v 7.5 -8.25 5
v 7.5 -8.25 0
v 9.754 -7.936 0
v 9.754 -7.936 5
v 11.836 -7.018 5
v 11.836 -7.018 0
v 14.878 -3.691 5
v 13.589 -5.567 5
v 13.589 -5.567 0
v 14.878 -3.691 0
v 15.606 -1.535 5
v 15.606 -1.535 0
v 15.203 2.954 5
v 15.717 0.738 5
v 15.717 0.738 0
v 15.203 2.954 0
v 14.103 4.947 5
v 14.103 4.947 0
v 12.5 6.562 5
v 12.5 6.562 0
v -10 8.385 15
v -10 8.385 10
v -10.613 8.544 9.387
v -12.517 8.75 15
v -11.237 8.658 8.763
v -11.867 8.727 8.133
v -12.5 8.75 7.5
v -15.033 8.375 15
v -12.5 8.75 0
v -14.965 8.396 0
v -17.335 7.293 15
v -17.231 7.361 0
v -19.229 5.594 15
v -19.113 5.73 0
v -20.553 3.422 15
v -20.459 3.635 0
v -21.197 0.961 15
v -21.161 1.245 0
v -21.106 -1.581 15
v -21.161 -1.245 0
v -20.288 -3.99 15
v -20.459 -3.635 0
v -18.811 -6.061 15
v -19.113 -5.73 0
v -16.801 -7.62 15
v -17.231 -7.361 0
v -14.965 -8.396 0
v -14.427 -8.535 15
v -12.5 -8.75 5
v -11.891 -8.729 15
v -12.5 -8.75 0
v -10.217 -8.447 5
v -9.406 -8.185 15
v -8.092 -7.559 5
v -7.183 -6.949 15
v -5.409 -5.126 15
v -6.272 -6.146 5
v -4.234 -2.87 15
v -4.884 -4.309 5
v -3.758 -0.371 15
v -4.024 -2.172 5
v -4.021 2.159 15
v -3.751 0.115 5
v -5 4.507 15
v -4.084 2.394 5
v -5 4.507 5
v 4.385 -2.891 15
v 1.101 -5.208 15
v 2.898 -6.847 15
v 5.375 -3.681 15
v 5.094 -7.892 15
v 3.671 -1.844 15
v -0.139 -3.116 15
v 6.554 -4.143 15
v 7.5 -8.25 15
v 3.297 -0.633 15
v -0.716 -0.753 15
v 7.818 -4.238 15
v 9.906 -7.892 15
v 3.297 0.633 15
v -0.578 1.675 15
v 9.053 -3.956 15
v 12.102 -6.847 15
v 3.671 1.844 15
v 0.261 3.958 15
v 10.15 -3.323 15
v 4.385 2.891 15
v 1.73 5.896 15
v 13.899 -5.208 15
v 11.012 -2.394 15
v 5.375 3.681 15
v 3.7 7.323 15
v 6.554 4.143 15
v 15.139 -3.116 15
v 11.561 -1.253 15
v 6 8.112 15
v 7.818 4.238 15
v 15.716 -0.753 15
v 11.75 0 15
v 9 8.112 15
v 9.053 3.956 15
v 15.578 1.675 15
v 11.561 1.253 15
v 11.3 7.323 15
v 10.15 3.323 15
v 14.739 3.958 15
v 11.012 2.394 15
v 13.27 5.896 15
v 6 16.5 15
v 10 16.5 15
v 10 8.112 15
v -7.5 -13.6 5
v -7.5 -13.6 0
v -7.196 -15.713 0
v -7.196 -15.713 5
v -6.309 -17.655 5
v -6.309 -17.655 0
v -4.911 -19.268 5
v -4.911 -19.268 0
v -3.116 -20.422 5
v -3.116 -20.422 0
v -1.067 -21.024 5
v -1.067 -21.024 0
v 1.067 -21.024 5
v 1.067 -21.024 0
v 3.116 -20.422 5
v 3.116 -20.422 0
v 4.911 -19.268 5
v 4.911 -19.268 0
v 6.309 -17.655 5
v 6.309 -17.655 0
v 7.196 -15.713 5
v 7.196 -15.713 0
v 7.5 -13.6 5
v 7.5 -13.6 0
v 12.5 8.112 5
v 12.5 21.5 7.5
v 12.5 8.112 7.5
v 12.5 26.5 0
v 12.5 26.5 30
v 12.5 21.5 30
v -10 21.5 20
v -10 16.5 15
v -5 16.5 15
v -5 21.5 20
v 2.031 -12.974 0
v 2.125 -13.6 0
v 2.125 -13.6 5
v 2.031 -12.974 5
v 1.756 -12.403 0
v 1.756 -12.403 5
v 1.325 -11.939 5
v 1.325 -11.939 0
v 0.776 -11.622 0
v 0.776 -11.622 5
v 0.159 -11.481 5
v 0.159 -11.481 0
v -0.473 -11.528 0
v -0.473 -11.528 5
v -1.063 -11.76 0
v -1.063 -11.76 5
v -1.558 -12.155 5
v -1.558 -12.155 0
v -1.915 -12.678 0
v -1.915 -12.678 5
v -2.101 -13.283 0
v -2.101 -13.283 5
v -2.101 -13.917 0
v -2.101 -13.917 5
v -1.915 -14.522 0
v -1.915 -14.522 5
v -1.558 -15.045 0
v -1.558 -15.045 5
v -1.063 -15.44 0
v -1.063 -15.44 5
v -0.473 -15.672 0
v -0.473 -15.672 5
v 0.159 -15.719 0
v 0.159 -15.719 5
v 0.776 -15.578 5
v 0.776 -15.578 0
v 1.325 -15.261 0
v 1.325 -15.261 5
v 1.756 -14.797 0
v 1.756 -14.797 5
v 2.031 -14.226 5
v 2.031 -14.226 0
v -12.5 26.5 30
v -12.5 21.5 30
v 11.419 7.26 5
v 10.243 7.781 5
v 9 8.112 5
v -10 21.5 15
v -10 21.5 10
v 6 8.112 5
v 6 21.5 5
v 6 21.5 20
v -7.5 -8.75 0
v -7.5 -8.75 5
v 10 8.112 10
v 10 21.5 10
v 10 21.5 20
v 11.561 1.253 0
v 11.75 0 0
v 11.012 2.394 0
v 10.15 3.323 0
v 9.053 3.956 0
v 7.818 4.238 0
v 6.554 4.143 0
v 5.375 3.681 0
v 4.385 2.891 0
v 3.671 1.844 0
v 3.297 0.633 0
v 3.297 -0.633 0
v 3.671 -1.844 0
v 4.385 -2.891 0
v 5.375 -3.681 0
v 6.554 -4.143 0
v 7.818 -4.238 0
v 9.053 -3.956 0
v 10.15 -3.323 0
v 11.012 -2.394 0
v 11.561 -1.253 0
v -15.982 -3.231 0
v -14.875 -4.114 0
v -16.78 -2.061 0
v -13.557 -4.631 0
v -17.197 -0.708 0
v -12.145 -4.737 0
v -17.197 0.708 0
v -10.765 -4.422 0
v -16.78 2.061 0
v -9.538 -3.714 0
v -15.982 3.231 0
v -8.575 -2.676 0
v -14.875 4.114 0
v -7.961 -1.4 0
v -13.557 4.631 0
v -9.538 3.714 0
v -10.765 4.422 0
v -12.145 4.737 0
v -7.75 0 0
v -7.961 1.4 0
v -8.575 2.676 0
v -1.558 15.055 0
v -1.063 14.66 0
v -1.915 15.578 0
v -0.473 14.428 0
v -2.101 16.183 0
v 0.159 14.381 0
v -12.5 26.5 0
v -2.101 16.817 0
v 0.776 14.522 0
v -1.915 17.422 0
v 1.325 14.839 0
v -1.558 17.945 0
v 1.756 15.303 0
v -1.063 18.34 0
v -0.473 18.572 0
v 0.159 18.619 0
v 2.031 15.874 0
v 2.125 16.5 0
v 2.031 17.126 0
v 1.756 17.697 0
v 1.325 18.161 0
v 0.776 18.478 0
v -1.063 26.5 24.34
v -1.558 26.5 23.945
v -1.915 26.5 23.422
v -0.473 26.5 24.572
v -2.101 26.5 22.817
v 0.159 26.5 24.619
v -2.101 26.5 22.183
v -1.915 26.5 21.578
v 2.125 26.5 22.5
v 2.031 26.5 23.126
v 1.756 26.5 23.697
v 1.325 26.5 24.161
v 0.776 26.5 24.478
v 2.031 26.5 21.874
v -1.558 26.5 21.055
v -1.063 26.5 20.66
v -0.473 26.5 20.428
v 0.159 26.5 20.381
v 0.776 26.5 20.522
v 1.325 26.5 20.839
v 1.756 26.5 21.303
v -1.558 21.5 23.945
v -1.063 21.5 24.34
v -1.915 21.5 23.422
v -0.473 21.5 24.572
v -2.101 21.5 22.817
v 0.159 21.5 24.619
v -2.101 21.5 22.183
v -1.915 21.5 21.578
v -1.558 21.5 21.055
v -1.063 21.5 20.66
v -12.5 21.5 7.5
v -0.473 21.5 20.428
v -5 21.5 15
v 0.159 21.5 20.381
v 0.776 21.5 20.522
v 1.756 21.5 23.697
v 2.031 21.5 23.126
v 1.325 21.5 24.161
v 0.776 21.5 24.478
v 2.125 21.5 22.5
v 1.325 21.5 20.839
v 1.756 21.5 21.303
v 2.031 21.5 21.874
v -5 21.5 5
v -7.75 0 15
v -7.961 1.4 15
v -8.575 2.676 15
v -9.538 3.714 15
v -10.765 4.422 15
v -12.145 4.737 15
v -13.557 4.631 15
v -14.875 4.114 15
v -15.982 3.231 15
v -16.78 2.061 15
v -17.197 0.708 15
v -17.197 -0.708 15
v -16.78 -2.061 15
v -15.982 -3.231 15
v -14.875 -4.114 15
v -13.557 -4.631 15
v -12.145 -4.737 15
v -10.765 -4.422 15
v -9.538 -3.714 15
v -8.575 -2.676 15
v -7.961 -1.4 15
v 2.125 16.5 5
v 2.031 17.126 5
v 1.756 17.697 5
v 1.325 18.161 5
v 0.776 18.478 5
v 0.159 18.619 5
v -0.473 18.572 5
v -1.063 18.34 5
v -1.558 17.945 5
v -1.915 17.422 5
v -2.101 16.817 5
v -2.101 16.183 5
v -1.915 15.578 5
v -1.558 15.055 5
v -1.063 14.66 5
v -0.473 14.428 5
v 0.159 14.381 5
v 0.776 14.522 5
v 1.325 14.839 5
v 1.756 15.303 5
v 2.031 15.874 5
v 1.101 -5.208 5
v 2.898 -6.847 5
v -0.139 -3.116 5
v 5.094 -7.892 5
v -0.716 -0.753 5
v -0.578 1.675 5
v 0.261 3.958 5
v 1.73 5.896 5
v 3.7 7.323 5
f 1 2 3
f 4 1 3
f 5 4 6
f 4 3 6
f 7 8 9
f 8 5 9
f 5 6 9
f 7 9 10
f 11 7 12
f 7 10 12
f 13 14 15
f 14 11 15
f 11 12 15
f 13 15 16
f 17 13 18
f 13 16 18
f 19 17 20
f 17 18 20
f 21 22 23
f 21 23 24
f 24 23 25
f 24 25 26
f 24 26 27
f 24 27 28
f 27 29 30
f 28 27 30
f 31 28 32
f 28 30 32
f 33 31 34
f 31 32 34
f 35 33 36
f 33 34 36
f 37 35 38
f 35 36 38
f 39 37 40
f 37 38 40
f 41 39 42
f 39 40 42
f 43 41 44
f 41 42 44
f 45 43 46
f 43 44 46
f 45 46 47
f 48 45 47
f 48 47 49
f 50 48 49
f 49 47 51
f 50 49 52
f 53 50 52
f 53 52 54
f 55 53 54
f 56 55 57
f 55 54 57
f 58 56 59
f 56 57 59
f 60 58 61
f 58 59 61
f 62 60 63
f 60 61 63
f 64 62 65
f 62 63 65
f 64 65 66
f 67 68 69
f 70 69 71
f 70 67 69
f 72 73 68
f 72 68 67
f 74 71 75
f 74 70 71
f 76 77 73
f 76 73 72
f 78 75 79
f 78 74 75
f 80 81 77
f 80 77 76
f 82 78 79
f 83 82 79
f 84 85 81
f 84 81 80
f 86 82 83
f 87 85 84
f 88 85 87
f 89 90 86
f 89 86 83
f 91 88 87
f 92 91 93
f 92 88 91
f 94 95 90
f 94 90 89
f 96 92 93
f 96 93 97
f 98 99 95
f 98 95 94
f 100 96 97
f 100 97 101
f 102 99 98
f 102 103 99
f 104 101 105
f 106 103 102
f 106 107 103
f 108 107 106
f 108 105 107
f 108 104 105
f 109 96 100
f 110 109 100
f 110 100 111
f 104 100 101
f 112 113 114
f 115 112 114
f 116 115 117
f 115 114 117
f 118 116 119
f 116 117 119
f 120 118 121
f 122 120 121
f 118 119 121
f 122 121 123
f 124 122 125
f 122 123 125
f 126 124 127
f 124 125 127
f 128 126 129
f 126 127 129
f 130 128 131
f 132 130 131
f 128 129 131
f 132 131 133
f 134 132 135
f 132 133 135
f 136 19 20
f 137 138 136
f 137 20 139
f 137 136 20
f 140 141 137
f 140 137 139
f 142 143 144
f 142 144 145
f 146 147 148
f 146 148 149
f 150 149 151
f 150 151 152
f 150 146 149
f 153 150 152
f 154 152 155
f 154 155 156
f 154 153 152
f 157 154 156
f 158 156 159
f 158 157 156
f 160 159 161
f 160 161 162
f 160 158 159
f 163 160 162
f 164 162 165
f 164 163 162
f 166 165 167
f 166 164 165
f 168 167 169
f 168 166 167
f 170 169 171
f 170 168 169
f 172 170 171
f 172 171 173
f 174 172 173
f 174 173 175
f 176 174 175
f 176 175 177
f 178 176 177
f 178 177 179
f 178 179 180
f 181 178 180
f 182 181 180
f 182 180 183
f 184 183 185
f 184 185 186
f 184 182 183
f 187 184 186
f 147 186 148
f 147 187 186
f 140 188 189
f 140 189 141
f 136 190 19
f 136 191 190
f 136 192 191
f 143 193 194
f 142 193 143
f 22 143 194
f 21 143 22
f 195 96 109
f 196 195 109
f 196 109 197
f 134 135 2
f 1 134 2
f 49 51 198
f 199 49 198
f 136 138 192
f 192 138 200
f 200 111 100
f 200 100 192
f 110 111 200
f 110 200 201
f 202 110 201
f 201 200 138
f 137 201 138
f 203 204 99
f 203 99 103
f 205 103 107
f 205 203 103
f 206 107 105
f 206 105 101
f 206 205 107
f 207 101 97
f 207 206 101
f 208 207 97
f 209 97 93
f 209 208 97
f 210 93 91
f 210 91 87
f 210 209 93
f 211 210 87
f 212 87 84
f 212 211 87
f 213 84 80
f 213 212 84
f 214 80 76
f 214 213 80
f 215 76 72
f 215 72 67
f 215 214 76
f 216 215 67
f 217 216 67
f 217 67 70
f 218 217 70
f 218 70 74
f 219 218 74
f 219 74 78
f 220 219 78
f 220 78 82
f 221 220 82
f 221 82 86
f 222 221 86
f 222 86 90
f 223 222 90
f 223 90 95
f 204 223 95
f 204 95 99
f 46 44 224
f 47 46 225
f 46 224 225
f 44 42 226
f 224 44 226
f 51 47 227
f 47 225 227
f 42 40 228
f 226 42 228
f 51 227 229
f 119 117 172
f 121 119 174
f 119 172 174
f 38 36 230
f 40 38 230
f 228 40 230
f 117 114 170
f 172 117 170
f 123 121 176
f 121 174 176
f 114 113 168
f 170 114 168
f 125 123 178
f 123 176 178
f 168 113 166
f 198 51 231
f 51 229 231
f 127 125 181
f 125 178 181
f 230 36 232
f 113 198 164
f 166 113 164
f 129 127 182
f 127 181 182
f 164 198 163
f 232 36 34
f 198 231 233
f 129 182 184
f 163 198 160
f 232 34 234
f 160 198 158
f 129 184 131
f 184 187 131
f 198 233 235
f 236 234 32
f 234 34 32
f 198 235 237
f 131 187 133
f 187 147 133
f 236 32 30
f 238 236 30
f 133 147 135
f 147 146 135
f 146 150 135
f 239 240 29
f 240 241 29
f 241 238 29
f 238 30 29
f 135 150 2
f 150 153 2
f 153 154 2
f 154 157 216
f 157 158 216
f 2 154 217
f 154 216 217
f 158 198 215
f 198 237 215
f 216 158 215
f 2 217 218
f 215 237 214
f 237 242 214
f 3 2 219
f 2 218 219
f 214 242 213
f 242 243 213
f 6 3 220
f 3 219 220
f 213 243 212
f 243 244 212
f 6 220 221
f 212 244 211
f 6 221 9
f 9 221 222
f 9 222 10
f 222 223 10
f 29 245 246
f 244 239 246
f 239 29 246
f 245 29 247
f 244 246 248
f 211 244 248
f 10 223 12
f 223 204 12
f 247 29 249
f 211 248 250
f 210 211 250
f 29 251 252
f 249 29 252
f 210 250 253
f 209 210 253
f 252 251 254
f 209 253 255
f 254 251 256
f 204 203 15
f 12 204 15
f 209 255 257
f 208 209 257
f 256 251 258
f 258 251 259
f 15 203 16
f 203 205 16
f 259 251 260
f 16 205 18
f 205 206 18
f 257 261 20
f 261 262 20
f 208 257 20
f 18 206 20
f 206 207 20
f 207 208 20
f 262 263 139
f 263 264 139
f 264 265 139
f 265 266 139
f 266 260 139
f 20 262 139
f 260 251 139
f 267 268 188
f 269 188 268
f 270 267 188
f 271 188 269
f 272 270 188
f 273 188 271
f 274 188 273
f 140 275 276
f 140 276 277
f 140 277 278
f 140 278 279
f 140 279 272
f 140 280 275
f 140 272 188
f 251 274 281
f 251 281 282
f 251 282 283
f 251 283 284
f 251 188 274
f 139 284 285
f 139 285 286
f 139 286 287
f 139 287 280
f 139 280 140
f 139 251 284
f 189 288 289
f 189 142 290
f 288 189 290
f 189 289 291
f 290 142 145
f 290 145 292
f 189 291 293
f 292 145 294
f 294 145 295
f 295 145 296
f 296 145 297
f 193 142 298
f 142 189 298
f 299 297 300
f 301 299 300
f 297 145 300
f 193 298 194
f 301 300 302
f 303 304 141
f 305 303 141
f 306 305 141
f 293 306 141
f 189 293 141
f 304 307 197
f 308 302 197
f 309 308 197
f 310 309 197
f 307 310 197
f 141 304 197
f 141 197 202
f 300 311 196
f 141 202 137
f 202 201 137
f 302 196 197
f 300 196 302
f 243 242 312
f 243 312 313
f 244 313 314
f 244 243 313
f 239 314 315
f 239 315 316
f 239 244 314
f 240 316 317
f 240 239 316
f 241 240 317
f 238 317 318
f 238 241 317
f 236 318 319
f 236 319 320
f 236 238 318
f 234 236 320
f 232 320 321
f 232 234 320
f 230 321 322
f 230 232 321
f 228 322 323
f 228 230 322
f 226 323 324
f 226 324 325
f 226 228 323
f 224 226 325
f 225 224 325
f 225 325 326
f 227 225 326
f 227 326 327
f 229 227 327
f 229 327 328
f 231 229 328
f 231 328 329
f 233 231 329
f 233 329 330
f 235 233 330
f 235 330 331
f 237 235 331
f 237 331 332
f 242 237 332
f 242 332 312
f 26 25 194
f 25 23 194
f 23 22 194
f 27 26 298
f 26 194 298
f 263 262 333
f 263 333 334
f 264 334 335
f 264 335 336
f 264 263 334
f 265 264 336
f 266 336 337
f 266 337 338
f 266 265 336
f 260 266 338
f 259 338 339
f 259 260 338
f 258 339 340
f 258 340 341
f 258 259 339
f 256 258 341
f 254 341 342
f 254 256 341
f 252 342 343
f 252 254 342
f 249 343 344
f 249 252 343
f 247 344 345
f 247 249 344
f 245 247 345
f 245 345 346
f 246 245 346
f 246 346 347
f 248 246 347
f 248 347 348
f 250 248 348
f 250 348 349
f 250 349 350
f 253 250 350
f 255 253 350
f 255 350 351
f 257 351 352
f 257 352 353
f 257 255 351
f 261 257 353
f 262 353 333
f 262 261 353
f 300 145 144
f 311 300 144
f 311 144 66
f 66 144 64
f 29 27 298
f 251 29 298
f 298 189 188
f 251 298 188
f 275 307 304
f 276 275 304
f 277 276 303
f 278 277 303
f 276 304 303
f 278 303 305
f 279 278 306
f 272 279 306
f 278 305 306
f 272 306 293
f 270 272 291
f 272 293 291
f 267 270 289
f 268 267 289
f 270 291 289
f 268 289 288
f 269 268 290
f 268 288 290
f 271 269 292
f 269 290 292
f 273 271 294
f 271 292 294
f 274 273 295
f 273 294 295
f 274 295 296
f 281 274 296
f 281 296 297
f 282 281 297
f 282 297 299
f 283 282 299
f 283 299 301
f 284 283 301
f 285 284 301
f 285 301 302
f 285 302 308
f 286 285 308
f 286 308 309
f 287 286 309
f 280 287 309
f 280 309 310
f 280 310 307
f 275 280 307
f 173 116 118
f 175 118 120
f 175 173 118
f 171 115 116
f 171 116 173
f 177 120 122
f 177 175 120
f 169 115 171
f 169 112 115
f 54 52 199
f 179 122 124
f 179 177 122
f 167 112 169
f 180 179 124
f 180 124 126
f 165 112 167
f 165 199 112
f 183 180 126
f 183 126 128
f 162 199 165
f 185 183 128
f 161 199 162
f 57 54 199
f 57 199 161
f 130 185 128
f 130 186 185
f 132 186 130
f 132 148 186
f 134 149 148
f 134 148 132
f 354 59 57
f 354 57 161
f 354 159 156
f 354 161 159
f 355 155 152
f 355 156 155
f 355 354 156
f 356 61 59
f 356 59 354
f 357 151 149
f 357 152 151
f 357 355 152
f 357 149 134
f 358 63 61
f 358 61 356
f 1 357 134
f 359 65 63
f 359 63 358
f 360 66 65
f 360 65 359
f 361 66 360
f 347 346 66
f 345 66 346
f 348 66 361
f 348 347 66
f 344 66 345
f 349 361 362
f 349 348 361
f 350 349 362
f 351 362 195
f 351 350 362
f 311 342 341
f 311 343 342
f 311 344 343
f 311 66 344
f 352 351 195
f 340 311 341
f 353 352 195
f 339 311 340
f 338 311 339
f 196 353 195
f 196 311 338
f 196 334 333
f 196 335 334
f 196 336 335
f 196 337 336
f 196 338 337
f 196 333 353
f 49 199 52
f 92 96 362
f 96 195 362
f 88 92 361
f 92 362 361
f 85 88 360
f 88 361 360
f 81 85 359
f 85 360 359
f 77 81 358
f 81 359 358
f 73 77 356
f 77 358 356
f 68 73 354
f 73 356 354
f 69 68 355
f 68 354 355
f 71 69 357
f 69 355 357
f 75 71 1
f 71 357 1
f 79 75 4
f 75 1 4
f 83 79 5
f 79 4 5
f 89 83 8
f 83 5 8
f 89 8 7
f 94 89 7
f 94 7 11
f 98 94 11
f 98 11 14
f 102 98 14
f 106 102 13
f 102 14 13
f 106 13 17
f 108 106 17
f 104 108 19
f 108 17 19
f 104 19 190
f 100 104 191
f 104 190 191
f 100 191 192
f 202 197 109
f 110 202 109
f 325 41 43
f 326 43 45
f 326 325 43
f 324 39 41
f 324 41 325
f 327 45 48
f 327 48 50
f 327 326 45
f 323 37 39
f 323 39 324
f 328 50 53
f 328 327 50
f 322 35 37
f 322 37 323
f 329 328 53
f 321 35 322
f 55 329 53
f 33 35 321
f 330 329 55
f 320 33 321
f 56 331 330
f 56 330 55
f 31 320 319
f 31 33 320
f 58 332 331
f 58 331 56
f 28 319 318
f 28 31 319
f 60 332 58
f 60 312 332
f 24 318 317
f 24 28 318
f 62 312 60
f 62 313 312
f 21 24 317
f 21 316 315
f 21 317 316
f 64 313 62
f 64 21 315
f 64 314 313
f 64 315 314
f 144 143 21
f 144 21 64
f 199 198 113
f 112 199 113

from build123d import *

# Parameters (mm, degrees)
F0_R          = 4.75
F0_R_2        = 2.125
F0_R_3        = 4.25
F1_DEPTH      = 5
F2_W          = 25
F2_H          = 5
F3_DEPTH      = 25
F4_R          = 8.75
F4_R_2        = 4.75
F4_R_3        = 8.25
F4_R_4        = 4.25
F5_DEPTH      = 10
F6_R          = 2.125
F7_DEPTH      = 5.001
F8_W          = 5
F8_H          = 16.9930609057
F8_W_2        = 4
F8_H_2        = 13.3875096302
F9_DEPTH      = 10
F10_T1_DEPTH  = 5
F10_T3_DEPTH  = 4
F10_T8_DEPTH  = 30.7168298797
F10_T13_DEPTH = 29.7168298797
F10_T18_DEPTH = 25.9731600242
F10_S20_R     = 4.75
F10_T21_DEPTH = 15
F10_T25_DEPTH = 13.3875096302


# Not quite as in the source:
# - a fillet or chamfer that OpenCascade refuses, or shapes differently, is made with other operations: its cross-section is extruded or revolved along the edge and cut away or added


with BuildPart() as f1:
    # F0 (on Top) → F1 (new body)
    with BuildSketch(Plane.XY):
        with BuildLine():
            Line((12.5, 26.5), (0, 26.5))
            Line((0, 26.5), (-12.5, 26.5))
            Line((-12.5, 26.5), (-12.5, 8.75))
            ThreePointArc((-12.5, 8.75), (-21.25, 0), (-12.5, -8.75))
            Line((-12.5, -8.75), (-7.5, -8.75))
            Line((-7.5, -8.75), (-7.5, -13.6))
            ThreePointArc((-7.5, -13.6), (-5.3033008589, -18.9033008589), (0, -21.1))
            ThreePointArc((0, -21.1), (5.3033008589, -18.9033008589), (7.5, -13.6))
            Line((7.5, -13.6), (7.5, -8.25))
            ThreePointArc((7.5, -8.25), (15.3166703137, -2.6385915194), (12.5, 6.5622023742))
            Line((12.5, 6.5622023742), (12.5, 26.5))
        make_face()
        with Locations((-12.5, 0)):
            Circle(F0_R, mode=Mode.SUBTRACT)
        with Locations((0, -13.6)):
            Circle(F0_R_2, mode=Mode.SUBTRACT)
        with Locations((7.5, 0)):
            Circle(F0_R_3, mode=Mode.SUBTRACT)
        with Locations((0, 16.5)):
            Circle(F0_R_2, mode=Mode.SUBTRACT)
    extrude(amount=F1_DEPTH)

    # F2 (on face) → F3 (join)
    with BuildSketch(Plane.XY.offset(5)):
        with Locations((0, 24)):
            Rectangle(F2_W, F2_H)
    extrude(amount=F3_DEPTH)

    # F4 (on face) → F5 (join)
    with BuildSketch(Plane.XY.offset(5)):
        with Locations((-12.5, 0)):
            Circle(F4_R)
        with Locations((-12.5, 0)):
            Circle(F4_R_2, mode=Mode.SUBTRACT)
        with Locations((7.5, 0)):
            Circle(F4_R_3)
        with Locations((7.5, 0)):
            Circle(F4_R_4, mode=Mode.SUBTRACT)
    extrude(amount=F5_DEPTH)

    # F6 (on face) → F7 (cut, through all)
    with BuildSketch(Plane.XZ.offset(-21.5)):
        with Locations((0, 22.5)):
            Circle(F6_R)
    extrude(amount=-F7_DEPTH, mode=Mode.SUBTRACT)

    # F8 (on face) → F9 (join)
    with BuildSketch(Plane.XY.offset(5)):
        with Locations((-7.5, 13.0034695472)):
            Rectangle(F8_W, F8_H)
        with Locations((8, 14.8062451849)):
            Rectangle(F8_W_2, F8_H_2)
    extrude(amount=F9_DEPTH)

    # F10: chamfer of 5 on 4 edges, made by hand

    # F10_s2 → F10_t1 (join)
    with BuildSketch(Plane.YZ.offset(-10)):
        Polygon((16.5, 15), (21.5, 20), (21.5, 15), align=None)
    extrude(amount=F10_T1_DEPTH)

    # F10_s4 → F10_t3 (join)
    with BuildSketch(Plane.YZ.offset(6)):
        Polygon((21.5, 20), (16.5, 15), (21.5, 15), align=None)
    extrude(amount=F10_T3_DEPTH)


with BuildPart() as f10_tool6:
    # F10_s7 → F10_t8 (new body)
    with BuildSketch(Plane.YZ.offset(7.8584149398)):
        Polygon((16.5, 15), (21.5, 20), (21.5, 15), align=None)
    extrude(amount=-F10_T8_DEPTH)

    split(bisect_by=Plane.YZ.offset(6), keep=Keep.TOP)


with BuildPart() as f1_1:
    add(f1.part)

    # F10_t5: union F10_tool6
    add(f10_tool6.part)


with BuildPart() as f10_tool11:
    # F10_s12 → F10_t13 (new body)
    with BuildSketch(Plane.YZ.offset(22.8584149398)):
        Polygon((21.5, 20), (16.5, 15), (21.5, 15), align=None)
    extrude(amount=-F10_T13_DEPTH)

    split(bisect_by=Plane.YZ.offset(-5), keep=Keep.BOTTOM)


with BuildPart() as f1_2:
    add(f1_1.part)

    # F10_t10: union F10_tool11
    add(f10_tool11.part)


with BuildPart() as f10_tool16:
    # F10_s17 → F10_t18 (new body)
    with BuildSketch(Plane.XZ.offset(-21.5)):
        Polygon((-10, 10), (-15, 5), (-10, 5), align=None)
    extrude(amount=F10_T18_DEPTH)

    split(bisect_by=Plane.YZ.offset(-12.5), keep=Keep.TOP)

    # F10_s20 → F10_t21 (cut, symmetric)
    with BuildSketch(Plane.XY.offset(7.5)):
        with Locations((-12.5, 0)):
            Circle(F10_S20_R)
    extrude(amount=F10_T21_DEPTH, both=True, mode=Mode.SUBTRACT)


with BuildPart() as f1_3:
    add(f1_2.part)

    # F10_t15: union F10_tool16
    add(f10_tool16.part)


with BuildPart() as f10_tool23:
    # F10_s24 → F10_t25 (new body)
    with BuildSketch(Plane.XZ.offset(-8.1124903698)):
        Polygon((10, 10), (15, 5), (10, 5), align=None)
    extrude(amount=-F10_T25_DEPTH)

    split(bisect_by=Plane.YZ.offset(12.5), keep=Keep.BOTTOM)


with BuildPart() as f1_4:
    add(f1_3.part)

    # F10_t22: union F10_tool23
    add(f10_tool23.part)


solid = f1_4.part
